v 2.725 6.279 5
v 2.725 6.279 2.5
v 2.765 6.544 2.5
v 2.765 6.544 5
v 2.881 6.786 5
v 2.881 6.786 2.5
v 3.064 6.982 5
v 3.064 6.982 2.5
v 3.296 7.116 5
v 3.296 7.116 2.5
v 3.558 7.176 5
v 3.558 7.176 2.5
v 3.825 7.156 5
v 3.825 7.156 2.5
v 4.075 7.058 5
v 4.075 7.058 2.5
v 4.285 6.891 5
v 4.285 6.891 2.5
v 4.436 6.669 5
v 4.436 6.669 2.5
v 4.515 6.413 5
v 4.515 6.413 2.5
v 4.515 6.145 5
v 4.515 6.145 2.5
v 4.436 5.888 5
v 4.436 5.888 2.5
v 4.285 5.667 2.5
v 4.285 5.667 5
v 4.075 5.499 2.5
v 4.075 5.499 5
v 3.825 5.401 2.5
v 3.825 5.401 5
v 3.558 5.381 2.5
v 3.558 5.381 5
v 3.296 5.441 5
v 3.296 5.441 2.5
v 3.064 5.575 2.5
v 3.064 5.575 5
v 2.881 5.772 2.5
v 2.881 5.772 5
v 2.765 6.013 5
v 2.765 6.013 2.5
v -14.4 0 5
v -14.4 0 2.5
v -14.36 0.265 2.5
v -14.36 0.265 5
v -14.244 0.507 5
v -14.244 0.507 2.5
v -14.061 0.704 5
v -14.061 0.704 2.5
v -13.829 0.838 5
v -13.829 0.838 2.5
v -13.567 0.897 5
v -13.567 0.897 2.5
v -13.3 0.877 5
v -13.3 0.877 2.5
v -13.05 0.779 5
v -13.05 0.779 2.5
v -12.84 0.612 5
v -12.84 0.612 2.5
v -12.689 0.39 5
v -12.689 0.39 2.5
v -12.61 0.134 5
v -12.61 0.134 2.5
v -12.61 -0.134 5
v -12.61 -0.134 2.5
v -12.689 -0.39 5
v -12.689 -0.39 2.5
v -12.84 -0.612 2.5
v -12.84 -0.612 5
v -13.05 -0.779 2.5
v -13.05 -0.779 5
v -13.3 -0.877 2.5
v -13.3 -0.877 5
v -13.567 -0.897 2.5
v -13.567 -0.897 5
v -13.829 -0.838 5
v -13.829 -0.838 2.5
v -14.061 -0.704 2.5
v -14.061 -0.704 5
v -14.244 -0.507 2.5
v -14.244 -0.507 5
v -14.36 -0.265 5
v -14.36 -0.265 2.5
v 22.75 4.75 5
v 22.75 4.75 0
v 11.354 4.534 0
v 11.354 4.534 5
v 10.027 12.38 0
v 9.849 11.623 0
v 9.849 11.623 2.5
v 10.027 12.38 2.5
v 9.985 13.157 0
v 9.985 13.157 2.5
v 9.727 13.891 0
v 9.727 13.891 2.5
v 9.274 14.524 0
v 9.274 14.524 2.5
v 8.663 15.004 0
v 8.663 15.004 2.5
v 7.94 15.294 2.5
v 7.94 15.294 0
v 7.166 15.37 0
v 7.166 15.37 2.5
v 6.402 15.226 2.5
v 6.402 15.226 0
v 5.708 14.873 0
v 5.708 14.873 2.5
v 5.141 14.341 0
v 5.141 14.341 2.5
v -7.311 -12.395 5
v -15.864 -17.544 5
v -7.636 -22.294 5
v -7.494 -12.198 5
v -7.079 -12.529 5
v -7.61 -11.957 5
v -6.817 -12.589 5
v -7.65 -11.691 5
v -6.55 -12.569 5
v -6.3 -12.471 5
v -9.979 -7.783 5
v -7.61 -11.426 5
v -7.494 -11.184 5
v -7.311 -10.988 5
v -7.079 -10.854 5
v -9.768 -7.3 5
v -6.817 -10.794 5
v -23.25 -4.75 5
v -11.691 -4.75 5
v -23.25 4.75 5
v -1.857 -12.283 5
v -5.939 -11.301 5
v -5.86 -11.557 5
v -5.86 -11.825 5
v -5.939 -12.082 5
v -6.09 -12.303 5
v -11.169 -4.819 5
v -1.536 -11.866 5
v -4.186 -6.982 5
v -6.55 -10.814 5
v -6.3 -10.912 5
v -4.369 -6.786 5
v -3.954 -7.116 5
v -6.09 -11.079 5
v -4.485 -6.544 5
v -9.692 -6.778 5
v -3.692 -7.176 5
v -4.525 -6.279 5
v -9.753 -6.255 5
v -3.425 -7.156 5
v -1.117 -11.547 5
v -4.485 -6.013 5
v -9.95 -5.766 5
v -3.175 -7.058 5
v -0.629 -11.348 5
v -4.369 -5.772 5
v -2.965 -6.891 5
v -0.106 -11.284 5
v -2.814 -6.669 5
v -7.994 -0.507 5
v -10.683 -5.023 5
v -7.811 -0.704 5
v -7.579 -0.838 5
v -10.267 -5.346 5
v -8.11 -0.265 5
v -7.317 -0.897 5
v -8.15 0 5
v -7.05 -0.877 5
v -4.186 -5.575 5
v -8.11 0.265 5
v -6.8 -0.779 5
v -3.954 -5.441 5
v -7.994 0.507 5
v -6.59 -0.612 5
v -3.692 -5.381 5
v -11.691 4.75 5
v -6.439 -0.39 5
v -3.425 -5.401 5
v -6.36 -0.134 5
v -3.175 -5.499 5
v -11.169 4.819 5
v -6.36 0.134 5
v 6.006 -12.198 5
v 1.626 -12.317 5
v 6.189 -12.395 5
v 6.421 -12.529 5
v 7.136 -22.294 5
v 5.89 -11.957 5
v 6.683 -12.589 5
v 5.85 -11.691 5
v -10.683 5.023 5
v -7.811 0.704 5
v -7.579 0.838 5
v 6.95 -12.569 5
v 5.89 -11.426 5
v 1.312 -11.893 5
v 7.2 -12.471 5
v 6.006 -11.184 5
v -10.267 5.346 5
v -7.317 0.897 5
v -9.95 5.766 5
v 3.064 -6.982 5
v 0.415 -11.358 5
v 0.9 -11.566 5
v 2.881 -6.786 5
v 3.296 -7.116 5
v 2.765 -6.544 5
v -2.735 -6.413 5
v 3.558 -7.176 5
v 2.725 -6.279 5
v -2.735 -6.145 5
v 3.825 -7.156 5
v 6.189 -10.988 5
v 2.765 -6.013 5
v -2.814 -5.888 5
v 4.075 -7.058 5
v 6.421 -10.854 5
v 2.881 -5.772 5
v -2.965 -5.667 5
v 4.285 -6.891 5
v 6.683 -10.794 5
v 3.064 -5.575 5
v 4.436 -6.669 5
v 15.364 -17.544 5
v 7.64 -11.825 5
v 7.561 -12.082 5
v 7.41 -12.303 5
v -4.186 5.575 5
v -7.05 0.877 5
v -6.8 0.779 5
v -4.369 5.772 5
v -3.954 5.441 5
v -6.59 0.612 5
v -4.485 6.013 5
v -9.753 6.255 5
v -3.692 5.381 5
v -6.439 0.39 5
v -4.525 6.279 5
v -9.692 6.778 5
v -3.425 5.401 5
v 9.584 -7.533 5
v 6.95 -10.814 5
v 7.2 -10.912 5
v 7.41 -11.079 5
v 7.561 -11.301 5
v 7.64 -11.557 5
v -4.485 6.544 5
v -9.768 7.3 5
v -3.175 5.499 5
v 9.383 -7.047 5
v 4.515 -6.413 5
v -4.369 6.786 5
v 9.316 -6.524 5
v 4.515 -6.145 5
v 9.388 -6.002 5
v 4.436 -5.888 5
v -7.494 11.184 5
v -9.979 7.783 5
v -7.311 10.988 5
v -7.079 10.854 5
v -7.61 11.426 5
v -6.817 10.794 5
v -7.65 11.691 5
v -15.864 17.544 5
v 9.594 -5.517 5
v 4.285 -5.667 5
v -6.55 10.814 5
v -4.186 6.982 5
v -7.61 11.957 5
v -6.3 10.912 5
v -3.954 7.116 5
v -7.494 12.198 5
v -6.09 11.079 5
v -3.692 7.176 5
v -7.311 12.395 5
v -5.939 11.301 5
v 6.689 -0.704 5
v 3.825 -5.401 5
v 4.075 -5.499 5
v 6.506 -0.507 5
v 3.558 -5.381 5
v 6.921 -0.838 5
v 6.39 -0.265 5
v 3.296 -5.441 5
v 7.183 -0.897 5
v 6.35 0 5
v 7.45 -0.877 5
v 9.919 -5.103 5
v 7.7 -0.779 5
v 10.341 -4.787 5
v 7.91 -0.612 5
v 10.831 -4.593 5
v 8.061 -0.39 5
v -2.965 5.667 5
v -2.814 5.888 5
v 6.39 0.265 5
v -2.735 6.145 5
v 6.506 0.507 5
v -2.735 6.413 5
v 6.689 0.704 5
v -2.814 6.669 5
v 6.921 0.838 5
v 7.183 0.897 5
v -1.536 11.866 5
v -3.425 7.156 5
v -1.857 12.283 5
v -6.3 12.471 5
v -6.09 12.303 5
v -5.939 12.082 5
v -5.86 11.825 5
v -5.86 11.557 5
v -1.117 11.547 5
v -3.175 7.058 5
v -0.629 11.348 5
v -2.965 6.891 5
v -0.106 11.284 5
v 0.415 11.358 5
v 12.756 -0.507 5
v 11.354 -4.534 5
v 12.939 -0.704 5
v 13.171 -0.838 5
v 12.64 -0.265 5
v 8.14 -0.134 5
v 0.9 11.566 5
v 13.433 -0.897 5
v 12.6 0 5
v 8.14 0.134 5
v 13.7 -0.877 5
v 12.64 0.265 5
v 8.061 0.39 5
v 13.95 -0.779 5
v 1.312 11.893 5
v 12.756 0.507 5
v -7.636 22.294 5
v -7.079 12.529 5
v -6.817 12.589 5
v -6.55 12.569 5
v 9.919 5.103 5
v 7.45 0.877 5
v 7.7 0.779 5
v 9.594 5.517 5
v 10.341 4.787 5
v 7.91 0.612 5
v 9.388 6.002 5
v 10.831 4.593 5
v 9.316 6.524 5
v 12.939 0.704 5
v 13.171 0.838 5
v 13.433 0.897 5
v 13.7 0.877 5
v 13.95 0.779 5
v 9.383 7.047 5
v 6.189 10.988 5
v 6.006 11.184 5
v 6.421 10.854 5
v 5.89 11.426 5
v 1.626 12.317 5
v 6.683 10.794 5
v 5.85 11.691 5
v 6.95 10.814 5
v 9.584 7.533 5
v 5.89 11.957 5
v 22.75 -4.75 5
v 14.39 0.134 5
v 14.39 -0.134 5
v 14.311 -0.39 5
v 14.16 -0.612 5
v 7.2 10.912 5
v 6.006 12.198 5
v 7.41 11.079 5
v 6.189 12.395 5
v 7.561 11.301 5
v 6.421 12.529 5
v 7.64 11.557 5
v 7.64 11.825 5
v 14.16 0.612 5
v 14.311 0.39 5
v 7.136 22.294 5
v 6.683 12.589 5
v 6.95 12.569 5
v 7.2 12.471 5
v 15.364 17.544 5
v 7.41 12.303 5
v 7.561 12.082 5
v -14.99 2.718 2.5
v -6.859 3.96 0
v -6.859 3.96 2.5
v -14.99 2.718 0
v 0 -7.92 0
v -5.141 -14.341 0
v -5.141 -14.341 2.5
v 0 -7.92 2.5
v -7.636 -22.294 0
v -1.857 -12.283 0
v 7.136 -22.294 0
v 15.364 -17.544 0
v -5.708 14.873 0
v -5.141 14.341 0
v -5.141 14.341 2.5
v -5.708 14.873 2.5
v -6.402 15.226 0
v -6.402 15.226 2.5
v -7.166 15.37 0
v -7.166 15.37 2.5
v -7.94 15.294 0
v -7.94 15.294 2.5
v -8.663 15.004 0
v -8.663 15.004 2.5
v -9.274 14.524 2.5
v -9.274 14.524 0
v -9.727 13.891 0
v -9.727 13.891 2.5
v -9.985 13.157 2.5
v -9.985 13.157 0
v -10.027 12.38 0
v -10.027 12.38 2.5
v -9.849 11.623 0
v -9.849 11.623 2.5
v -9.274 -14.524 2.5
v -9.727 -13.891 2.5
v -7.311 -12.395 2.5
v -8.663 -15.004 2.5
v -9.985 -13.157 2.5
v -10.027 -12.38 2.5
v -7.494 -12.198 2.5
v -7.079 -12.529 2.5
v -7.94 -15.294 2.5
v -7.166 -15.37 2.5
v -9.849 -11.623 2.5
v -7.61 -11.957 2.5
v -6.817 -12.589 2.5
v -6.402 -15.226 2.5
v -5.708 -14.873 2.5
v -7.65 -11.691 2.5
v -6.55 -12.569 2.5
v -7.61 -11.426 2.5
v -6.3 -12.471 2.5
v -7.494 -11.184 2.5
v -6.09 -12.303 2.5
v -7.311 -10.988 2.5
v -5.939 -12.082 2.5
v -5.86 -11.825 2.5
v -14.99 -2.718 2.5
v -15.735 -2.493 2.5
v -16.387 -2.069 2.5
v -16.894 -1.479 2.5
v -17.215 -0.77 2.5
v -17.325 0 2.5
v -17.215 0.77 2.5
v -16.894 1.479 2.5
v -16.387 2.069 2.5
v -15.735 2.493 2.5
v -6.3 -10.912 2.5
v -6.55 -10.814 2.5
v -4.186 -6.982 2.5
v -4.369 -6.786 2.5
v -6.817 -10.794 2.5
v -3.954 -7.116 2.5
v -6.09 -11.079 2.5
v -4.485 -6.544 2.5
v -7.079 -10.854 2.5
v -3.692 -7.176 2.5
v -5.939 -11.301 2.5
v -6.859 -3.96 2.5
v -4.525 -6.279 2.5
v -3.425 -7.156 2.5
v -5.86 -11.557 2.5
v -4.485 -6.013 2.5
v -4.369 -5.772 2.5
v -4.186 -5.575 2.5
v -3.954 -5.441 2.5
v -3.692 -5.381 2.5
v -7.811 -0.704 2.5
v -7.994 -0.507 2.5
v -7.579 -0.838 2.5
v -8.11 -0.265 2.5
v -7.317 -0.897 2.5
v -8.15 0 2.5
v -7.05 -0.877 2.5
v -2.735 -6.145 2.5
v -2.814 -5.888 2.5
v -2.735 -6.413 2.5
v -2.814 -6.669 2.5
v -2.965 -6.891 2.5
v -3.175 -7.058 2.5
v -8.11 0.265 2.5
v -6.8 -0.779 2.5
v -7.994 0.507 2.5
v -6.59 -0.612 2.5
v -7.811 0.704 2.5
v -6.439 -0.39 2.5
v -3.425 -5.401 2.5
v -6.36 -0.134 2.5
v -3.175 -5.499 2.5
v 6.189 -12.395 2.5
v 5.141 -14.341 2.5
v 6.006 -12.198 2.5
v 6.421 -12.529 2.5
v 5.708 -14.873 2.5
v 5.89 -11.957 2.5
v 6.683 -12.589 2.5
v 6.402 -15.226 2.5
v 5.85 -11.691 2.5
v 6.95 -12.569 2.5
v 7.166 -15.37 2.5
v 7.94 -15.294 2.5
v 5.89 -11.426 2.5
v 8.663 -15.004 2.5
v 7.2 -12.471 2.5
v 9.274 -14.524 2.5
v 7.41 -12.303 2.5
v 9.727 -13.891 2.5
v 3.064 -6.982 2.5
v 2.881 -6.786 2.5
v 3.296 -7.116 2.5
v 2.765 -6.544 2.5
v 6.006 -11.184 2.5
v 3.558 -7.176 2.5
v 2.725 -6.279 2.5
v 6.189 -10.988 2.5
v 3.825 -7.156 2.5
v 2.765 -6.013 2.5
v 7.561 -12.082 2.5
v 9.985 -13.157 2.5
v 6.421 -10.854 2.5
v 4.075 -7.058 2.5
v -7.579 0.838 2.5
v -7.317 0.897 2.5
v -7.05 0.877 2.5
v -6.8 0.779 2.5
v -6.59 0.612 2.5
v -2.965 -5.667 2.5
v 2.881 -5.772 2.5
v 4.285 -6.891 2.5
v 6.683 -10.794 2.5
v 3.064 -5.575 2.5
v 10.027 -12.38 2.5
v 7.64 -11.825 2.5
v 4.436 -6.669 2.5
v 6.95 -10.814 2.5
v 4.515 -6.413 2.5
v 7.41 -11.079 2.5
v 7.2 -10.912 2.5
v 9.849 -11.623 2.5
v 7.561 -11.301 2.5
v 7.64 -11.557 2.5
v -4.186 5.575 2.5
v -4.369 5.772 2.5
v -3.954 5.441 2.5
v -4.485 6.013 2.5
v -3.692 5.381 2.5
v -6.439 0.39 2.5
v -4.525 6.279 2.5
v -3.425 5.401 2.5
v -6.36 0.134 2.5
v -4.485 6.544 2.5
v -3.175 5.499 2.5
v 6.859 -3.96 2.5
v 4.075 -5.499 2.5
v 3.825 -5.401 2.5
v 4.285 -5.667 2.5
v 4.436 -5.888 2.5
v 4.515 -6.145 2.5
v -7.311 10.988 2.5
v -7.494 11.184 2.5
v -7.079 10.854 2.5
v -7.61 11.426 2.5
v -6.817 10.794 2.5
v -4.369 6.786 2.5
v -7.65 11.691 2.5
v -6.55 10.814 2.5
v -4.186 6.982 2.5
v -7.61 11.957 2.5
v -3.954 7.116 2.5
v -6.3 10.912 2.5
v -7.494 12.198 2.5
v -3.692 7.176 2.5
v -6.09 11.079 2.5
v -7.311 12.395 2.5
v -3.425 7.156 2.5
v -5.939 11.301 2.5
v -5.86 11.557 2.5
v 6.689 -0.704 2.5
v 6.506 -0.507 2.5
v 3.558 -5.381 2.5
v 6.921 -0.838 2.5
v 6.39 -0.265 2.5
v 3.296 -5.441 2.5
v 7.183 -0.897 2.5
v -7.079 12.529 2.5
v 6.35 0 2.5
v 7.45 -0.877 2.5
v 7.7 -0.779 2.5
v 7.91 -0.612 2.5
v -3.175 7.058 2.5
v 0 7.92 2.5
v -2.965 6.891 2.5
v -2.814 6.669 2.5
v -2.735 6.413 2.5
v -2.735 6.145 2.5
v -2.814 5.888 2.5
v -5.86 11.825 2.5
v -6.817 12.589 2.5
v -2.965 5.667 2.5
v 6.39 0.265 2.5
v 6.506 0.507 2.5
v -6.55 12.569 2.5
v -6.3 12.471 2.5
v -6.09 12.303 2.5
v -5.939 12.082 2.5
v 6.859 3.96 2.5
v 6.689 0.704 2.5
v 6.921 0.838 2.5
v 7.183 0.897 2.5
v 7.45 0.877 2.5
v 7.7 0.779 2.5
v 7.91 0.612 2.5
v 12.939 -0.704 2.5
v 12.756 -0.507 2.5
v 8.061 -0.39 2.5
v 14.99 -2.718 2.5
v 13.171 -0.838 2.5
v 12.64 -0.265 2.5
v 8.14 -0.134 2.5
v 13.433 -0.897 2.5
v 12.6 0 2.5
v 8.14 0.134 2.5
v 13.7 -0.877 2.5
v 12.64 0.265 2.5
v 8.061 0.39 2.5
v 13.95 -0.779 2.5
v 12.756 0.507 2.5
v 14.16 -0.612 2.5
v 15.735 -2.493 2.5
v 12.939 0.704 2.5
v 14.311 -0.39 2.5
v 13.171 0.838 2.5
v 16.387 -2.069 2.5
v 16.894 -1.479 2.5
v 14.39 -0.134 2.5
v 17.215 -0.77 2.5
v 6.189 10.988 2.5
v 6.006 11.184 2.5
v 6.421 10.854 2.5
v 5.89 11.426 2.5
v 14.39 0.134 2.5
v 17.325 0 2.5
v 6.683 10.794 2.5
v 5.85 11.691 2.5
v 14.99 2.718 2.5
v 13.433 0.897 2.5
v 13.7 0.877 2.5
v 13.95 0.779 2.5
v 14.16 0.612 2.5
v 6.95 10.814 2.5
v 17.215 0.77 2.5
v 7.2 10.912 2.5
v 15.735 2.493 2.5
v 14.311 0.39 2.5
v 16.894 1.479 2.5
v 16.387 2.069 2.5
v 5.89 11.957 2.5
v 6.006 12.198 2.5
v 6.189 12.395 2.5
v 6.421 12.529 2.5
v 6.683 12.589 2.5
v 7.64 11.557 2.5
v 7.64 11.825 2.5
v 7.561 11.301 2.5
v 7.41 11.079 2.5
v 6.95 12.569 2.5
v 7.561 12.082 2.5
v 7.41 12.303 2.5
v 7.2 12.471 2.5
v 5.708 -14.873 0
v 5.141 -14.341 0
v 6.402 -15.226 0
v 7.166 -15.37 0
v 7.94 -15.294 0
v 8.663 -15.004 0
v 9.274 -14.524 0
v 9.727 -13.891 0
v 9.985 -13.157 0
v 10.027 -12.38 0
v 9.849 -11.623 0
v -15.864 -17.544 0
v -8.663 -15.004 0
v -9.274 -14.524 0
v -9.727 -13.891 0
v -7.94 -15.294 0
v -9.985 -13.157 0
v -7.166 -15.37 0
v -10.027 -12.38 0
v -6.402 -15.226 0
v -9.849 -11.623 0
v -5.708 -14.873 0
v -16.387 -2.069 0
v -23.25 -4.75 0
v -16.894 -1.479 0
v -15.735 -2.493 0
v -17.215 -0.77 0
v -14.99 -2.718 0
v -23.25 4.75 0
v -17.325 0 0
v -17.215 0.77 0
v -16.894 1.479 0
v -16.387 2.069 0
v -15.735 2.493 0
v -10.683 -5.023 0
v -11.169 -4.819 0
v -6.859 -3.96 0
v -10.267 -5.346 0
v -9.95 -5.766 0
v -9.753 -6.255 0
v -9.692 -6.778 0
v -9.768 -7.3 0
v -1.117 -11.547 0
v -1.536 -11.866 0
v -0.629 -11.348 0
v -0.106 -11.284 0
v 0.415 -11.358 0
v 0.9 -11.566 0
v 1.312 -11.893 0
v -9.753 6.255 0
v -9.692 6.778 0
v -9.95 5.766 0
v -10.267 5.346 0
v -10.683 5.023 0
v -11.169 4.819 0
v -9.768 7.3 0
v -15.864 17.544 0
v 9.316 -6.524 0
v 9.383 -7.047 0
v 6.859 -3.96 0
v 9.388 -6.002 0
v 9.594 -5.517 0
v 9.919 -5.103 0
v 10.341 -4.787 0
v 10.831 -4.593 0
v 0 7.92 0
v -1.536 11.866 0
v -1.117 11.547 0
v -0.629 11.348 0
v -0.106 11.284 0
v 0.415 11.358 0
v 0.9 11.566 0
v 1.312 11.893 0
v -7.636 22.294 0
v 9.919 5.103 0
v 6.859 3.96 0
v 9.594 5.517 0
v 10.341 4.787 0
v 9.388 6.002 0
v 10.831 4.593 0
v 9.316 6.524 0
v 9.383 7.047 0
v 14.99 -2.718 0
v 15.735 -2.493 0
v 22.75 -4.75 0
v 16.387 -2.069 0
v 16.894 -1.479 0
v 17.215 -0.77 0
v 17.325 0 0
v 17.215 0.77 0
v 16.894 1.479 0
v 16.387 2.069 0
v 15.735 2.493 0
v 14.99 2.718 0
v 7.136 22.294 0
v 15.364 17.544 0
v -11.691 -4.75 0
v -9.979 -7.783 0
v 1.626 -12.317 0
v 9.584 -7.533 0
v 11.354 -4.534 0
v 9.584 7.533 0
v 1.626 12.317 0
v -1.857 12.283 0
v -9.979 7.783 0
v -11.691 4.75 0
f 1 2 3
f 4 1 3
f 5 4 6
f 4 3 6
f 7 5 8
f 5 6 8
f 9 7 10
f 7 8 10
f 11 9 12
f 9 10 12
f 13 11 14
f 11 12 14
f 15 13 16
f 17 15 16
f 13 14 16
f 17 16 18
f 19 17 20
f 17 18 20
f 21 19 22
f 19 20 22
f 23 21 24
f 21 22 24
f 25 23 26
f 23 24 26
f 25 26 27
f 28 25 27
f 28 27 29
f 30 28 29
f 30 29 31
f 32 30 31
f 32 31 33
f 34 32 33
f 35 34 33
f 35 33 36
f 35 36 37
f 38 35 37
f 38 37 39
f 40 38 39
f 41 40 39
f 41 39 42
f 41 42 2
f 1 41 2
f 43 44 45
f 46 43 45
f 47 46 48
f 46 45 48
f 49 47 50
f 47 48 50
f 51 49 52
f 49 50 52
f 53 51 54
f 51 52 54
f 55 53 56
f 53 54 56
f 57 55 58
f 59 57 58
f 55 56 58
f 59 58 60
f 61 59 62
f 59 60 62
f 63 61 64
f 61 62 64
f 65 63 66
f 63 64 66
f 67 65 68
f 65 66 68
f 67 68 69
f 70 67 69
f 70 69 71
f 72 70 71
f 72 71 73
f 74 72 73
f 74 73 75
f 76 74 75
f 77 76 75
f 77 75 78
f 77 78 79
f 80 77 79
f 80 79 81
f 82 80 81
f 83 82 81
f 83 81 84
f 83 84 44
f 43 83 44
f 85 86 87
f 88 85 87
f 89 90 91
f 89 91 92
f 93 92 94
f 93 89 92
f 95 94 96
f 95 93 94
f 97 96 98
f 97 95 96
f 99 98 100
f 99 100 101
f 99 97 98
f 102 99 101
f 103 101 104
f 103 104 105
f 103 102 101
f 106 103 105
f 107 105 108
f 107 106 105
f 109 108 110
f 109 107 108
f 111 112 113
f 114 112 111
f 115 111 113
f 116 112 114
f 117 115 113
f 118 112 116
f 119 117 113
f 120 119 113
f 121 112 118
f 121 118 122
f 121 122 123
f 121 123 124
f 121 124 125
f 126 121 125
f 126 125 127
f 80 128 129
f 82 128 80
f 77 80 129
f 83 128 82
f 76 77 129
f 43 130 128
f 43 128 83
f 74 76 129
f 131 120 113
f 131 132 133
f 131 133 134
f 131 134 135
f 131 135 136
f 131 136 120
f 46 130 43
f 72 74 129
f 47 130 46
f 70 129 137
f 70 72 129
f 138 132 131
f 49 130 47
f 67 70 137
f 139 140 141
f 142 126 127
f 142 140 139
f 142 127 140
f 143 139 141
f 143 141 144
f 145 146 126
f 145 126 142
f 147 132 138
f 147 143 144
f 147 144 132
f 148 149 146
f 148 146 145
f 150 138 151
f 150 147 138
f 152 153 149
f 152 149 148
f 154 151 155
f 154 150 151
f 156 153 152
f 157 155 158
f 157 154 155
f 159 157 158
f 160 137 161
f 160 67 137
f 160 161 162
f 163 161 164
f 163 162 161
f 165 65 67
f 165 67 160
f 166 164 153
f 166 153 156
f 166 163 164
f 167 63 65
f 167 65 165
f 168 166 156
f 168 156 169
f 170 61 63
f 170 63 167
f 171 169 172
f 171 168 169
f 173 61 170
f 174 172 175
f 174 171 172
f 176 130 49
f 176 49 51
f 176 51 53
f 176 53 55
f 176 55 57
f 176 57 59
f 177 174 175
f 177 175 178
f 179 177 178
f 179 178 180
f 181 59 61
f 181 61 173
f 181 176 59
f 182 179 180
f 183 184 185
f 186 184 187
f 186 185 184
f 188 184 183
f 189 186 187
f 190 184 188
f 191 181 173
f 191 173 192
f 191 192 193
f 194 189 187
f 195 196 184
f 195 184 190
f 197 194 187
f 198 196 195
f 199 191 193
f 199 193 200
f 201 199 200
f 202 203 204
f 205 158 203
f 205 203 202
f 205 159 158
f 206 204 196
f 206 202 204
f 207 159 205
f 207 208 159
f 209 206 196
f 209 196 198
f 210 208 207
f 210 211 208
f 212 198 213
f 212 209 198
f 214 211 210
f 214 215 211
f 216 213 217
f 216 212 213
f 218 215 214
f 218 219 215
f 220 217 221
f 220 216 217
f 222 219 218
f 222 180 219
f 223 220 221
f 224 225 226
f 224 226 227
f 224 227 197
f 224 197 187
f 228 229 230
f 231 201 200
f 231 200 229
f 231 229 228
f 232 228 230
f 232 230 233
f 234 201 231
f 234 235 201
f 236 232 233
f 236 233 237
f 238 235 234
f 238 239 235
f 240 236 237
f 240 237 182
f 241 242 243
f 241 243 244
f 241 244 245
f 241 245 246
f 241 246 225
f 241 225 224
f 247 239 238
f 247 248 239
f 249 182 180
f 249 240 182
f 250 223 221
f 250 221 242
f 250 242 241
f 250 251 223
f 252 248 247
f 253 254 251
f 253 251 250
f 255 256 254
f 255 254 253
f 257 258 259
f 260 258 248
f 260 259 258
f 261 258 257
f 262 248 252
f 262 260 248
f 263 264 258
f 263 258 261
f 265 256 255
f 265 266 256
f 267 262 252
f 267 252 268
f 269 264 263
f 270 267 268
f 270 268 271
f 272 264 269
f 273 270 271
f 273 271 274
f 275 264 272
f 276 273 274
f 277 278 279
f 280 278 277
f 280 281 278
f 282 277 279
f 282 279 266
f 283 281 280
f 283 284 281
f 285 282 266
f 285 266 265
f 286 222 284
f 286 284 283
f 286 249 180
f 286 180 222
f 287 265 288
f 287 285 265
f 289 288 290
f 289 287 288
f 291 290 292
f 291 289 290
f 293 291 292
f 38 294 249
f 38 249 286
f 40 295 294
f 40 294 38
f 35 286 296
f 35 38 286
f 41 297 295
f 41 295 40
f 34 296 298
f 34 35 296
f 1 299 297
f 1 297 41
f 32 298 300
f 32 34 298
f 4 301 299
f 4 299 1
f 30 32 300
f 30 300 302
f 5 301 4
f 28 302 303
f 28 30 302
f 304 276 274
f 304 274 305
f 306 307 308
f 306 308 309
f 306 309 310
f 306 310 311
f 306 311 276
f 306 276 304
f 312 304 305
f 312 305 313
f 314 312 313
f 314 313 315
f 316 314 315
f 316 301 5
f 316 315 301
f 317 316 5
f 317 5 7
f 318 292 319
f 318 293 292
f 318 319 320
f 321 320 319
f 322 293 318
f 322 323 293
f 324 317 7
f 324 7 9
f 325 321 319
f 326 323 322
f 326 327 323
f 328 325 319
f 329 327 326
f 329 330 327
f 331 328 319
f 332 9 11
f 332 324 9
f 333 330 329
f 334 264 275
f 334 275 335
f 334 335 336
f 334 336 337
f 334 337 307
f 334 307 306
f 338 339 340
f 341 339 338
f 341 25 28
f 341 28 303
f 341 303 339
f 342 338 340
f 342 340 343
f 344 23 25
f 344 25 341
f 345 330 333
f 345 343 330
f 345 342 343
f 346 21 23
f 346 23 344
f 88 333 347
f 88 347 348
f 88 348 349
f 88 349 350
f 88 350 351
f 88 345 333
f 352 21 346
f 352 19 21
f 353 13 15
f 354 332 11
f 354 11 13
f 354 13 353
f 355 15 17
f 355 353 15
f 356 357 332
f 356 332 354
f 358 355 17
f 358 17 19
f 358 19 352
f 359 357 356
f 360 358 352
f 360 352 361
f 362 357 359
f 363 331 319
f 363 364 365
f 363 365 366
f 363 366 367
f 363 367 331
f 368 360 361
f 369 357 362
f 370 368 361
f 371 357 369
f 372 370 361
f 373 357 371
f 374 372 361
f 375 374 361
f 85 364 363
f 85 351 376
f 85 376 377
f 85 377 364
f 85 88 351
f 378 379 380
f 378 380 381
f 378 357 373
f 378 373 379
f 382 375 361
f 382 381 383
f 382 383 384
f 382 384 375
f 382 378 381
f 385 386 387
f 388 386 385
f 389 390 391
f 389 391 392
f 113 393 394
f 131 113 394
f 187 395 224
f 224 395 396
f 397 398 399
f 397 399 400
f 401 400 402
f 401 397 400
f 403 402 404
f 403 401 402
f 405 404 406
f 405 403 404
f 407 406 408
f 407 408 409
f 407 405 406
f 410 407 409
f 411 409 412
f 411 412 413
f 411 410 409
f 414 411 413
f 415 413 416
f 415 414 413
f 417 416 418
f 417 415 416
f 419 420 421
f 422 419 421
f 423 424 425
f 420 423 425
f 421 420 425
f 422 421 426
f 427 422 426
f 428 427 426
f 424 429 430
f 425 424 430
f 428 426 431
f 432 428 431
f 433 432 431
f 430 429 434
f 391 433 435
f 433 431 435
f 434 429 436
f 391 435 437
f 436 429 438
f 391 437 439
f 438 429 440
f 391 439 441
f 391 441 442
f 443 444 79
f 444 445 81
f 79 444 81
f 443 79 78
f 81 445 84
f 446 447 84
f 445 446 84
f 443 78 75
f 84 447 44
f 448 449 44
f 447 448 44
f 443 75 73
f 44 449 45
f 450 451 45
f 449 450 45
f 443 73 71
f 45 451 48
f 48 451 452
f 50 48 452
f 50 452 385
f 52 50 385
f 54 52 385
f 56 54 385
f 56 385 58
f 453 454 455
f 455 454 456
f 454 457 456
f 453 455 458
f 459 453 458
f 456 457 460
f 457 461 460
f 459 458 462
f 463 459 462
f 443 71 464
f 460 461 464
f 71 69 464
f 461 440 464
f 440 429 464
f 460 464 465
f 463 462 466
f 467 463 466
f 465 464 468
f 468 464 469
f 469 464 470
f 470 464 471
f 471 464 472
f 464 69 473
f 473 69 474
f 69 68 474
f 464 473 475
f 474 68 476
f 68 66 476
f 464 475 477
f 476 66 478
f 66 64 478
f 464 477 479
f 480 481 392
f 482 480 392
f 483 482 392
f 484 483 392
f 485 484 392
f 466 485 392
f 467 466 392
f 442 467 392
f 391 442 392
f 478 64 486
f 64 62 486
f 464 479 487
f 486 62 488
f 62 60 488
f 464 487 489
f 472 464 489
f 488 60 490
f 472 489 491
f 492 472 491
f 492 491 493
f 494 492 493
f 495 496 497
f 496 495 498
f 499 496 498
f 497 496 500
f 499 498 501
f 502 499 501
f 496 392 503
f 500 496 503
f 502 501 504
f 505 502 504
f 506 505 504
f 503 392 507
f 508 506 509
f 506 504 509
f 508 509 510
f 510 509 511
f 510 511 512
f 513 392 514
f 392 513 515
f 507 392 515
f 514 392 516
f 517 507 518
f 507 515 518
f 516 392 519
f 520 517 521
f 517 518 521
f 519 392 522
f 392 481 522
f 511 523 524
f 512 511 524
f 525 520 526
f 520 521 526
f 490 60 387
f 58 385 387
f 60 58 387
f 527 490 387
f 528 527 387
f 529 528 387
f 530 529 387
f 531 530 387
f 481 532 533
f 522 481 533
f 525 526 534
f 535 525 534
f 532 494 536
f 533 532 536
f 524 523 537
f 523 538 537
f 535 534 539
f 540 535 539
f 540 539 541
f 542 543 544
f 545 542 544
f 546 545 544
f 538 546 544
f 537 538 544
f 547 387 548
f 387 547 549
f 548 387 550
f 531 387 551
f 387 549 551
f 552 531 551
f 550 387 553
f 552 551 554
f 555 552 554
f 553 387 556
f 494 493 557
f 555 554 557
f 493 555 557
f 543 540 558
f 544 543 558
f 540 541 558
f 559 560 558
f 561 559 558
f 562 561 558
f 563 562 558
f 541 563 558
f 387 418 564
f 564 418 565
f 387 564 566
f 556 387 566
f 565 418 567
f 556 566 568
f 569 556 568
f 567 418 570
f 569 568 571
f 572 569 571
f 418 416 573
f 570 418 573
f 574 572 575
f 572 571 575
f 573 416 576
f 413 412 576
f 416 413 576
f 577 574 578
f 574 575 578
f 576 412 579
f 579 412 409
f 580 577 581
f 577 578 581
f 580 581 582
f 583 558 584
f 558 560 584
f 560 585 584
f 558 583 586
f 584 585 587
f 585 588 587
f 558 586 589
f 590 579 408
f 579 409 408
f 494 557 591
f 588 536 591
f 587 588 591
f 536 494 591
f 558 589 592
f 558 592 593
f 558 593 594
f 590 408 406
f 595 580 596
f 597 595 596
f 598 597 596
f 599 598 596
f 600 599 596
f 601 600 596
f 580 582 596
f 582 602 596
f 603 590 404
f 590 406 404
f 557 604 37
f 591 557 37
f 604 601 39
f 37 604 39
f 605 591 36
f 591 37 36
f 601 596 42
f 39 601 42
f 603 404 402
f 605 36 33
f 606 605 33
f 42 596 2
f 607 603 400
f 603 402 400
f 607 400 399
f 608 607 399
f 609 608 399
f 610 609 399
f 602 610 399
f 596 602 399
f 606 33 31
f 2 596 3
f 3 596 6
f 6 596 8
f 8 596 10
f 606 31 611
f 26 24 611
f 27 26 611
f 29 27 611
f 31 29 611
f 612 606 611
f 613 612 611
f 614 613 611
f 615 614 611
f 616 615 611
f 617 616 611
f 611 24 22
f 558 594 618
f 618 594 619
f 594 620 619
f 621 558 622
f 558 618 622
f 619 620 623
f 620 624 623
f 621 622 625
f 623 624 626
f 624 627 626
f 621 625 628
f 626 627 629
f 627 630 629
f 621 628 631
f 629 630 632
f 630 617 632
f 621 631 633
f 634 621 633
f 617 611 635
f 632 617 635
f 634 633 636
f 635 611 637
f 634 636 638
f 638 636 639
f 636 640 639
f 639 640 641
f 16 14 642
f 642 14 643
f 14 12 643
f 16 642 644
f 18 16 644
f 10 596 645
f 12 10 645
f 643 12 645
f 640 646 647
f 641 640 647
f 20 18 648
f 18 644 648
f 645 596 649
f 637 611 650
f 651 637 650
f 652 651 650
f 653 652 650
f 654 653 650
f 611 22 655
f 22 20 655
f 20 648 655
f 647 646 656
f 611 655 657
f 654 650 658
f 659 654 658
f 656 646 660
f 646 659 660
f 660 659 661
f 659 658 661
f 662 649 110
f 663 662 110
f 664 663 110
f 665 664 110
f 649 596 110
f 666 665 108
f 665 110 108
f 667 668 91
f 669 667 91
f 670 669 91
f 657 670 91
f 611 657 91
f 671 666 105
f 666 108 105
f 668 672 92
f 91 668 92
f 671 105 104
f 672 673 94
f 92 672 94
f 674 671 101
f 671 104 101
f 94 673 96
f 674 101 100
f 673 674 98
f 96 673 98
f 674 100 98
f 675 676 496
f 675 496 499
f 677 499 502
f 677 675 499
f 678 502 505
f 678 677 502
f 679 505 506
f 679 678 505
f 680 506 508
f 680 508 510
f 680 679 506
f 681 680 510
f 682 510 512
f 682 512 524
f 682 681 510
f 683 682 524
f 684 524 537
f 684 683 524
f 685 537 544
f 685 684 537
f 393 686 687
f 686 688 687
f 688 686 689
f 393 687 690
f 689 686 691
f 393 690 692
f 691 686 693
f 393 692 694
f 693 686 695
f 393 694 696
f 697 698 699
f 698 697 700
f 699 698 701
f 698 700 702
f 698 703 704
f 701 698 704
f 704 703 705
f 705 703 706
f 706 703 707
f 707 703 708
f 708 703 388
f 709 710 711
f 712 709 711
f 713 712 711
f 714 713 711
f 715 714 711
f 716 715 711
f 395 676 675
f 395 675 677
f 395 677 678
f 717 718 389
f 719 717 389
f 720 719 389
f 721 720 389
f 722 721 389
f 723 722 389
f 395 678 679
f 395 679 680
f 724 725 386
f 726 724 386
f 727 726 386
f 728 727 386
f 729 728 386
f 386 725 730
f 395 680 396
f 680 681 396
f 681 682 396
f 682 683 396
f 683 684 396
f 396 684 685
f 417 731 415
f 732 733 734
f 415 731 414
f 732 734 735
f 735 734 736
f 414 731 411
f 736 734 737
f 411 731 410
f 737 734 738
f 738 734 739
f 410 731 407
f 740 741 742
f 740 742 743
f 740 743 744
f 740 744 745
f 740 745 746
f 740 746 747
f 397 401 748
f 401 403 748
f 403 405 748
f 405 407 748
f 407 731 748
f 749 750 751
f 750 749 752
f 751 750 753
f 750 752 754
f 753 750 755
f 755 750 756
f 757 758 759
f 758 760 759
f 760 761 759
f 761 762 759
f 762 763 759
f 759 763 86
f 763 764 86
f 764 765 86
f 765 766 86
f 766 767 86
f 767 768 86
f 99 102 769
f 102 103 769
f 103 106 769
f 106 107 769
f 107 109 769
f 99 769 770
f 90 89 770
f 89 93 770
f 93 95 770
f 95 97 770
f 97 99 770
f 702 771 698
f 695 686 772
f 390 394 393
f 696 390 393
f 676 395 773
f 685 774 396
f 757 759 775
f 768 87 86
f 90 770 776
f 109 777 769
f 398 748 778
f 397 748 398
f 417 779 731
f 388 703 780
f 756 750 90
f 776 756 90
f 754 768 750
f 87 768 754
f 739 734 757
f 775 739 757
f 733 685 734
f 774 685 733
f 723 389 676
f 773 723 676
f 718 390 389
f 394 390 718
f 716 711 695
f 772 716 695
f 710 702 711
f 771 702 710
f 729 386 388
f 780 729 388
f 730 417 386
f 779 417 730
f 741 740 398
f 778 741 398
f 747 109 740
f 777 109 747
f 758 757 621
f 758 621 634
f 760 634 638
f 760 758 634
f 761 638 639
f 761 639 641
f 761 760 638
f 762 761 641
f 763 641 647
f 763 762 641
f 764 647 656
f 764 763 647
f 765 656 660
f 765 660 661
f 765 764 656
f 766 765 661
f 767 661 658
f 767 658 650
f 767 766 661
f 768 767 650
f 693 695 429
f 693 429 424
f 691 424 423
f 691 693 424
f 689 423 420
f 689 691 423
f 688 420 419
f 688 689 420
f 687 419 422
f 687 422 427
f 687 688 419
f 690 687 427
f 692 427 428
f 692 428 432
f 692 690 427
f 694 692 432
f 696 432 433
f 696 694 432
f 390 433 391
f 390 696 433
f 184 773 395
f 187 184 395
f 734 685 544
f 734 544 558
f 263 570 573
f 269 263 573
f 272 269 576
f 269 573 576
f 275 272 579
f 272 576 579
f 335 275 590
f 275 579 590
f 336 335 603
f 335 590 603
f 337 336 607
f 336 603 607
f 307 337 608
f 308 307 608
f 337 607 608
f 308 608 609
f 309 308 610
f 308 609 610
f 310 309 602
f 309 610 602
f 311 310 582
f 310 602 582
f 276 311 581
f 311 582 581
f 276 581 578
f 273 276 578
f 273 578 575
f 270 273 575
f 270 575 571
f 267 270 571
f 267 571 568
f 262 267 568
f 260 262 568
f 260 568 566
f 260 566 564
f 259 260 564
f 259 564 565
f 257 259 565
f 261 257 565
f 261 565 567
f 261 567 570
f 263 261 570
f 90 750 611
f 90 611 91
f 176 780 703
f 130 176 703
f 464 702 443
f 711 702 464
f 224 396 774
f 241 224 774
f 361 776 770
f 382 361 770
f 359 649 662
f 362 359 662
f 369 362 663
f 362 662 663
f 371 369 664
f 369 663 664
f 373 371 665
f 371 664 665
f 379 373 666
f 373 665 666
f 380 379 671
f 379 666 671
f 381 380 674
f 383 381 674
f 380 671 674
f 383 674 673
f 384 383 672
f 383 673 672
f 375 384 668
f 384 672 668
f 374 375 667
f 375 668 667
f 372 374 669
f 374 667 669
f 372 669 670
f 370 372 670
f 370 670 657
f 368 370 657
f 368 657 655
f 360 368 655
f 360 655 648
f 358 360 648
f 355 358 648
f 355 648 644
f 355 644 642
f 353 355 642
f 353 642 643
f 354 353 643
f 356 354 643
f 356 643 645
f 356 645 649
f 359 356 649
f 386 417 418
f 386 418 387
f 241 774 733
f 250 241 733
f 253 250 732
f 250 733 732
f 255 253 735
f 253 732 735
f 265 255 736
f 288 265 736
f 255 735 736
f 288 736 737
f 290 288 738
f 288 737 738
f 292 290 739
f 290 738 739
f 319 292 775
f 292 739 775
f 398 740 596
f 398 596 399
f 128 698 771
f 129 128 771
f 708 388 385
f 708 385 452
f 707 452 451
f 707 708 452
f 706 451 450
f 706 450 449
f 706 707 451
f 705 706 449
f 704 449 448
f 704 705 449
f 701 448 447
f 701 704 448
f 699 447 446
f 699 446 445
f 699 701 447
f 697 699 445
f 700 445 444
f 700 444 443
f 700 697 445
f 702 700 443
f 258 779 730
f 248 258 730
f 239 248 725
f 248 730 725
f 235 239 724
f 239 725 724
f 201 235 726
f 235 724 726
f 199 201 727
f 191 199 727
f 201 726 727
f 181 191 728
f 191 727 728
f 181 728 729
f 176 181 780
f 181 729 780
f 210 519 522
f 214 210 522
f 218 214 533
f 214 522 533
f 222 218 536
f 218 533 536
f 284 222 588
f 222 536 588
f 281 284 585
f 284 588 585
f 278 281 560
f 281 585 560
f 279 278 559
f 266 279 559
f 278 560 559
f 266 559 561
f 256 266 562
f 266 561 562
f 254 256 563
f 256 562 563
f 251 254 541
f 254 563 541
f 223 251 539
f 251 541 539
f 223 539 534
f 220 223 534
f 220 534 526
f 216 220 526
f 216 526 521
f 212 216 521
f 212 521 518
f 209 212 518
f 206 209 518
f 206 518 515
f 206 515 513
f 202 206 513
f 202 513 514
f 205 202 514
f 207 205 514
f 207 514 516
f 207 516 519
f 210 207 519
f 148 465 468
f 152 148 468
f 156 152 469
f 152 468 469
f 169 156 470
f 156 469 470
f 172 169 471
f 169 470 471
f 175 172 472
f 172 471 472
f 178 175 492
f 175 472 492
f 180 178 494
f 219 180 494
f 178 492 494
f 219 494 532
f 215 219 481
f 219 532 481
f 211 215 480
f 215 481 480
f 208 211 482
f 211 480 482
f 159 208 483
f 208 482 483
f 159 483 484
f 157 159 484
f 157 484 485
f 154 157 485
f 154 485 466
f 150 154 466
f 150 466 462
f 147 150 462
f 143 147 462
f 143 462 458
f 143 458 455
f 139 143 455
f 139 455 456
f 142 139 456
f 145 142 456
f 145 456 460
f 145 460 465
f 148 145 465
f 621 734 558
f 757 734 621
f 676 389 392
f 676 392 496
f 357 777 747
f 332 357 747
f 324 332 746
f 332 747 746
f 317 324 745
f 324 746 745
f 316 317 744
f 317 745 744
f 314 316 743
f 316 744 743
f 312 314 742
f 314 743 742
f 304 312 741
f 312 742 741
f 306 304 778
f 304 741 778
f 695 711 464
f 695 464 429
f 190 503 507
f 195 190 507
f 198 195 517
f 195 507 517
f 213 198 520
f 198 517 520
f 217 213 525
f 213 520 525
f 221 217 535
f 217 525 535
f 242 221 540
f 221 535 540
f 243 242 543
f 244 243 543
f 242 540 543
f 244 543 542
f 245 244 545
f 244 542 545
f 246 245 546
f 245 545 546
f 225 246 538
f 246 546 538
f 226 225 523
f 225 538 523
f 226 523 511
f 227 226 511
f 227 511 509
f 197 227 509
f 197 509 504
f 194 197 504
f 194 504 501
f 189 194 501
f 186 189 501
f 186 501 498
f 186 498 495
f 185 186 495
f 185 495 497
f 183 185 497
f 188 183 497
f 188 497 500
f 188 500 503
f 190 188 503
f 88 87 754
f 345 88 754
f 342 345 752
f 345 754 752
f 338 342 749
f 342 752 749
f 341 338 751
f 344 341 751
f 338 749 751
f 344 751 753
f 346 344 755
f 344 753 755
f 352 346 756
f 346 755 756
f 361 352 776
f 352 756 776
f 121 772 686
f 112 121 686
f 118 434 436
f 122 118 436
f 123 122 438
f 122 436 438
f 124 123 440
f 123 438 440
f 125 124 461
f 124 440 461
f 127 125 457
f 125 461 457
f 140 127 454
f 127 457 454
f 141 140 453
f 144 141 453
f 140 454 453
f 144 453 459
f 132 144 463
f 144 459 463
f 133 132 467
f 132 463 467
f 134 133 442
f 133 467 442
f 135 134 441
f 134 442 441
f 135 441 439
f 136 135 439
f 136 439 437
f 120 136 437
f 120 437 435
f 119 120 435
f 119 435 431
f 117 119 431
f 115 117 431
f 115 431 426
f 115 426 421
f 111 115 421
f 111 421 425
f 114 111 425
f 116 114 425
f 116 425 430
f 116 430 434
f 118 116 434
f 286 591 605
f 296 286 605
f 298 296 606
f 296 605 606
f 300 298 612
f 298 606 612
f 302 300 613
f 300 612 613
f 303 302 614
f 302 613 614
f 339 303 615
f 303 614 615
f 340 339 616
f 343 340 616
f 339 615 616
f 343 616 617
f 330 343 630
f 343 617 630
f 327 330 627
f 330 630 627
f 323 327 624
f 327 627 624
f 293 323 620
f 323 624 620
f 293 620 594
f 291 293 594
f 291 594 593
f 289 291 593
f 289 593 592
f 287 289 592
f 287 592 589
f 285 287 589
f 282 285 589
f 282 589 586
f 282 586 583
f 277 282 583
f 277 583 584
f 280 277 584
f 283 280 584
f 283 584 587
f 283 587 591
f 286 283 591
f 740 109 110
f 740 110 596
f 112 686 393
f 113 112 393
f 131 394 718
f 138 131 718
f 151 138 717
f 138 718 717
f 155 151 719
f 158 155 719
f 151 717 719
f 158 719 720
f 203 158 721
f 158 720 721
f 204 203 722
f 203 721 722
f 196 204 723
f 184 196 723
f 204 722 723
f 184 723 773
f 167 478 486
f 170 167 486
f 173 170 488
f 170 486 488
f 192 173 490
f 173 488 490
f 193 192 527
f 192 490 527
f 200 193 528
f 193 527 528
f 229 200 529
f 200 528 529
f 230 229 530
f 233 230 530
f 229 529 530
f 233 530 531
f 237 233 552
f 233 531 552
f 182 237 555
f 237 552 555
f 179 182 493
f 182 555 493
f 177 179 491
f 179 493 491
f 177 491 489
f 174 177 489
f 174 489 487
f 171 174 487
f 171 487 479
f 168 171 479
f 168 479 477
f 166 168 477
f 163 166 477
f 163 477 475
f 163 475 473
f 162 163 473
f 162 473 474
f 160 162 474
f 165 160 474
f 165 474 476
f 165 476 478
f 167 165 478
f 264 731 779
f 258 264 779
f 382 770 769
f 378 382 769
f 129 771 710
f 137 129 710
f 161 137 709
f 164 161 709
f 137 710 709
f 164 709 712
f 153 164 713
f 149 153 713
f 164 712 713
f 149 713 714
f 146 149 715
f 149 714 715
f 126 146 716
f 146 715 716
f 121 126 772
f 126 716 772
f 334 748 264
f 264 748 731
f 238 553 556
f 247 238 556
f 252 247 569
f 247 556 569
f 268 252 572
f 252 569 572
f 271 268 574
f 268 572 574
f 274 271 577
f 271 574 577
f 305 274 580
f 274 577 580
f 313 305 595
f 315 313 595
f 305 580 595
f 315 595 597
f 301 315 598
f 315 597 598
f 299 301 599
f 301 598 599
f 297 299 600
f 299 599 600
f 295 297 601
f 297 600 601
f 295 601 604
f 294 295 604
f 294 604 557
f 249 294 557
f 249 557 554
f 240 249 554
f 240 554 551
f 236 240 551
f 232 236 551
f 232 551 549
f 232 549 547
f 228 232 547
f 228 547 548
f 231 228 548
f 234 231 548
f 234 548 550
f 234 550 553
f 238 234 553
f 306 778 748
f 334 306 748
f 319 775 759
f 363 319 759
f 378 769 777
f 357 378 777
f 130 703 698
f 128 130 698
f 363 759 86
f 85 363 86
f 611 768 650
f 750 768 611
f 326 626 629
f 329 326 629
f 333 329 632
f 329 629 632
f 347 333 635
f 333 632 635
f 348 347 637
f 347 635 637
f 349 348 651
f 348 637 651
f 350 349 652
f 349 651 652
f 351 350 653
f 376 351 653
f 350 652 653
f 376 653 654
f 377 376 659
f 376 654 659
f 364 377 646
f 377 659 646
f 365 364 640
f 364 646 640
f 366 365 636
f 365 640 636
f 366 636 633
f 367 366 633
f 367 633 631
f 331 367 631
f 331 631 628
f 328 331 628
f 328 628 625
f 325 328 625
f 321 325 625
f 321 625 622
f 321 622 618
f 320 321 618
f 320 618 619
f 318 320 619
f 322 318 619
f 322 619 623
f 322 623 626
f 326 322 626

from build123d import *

# Parameters (mm, degrees)
BOSS_EXTRUDE2_DEPTH = 5
CUT_EXTRUDE5_DEPTH  = 2.5
SKETCH8_R           = 0.9
CUT_EXTRUDE6_DEPTH  = 33.308147585


with BuildPart() as part:
    # Sketch1 → Boss-Extrude2 (new body)
    with BuildSketch(Plane.XY):
        with BuildLine():
            Line((-23.25, 4.75), (-23.25, -4.75))
            Line((-23.25, -4.75), (-11.691342951, -4.75))
            ThreePointArc((-11.691342951, -4.75), (-9.949887623, -5.766468943), (-9.978567551, -7.78266666))
            Line((-9.978567551, -7.78266666), (-15.863620668, -17.543584287))
            Line((-15.863620668, -17.543584287), (-7.636379332, -22.293584287))
            Line((-7.636379332, -22.293584287), (-1.857050808, -12.283493649))
            ThreePointArc((-1.857050808, -12.283493649), (-0.106035217, -11.283583567), (1.625703261, -12.316519972))
            Line((1.625703261, -12.316519972), (7.136379332, -22.293584287))
            Line((7.136379332, -22.293584287), (15.363620668, -17.543584287))
            Line((15.363620668, -17.543584287), (9.584292144, -7.533493649))
            ThreePointArc((9.584292144, -7.533493649), (9.593852406, -5.517114624), (11.354270812, -4.533853312))
            Line((11.354270812, -4.533853312), (22.75, -4.75))
            Line((22.75, -4.75), (22.75, 4.75))
            Line((22.75, 4.75), (11.354270812, 4.533853312))
            ThreePointArc((11.354270812, 4.533853312), (9.593852406, 5.517114624), (9.584292144, 7.533493649))
            Line((9.584292144, 7.533493649), (15.363620668, 17.543584287))
            Line((15.363620668, 17.543584287), (7.136379332, 22.293584287))
            Line((7.136379332, 22.293584287), (1.625703261, 12.316519972))
            ThreePointArc((1.625703261, 12.316519972), (-0.106035217, 11.283583567), (-1.857050808, 12.283493649))
            Line((-1.857050808, 12.283493649), (-7.636379332, 22.293584287))
            Line((-7.636379332, 22.293584287), (-15.863620668, 17.543584287))
            Line((-15.863620668, 17.543584287), (-9.978567551, 7.78266666))
            ThreePointArc((-9.978567551, 7.78266666), (-9.949887623, 5.766468943), (-11.691342951, 4.75))
            Line((-11.691342951, 4.75), (-23.25, 4.75))
        make_face()
    extrude(amount=BOSS_EXTRUDE2_DEPTH)

    # Sketch7 → Cut-Extrude5 (cut)
    with BuildSketch(Plane(origin=(0, 0, 0), x_dir=(-1, 0, 0), z_dir=(0, 0, -1))):
        with BuildLine():
            Line((-6.859008781, 3.960050566), (-9.849329973, 11.622556693))
            ThreePointArc((-9.849329973, 11.622556693), (-8.6625, 15.003890121), (-5.140764367, 14.341048313))
            Line((-5.140764367, 14.341048313), (0, 7.920101132))
            Line((0, 7.920101132), (5.140764367, 14.341048313))
            ThreePointArc((5.140764367, 14.341048313), (8.6625, 15.003890121), (9.849329973, 11.622556693))
            Line((9.849329973, 11.622556693), (6.859008781, 3.960050566))
            Line((6.859008781, 3.960050566), (14.99009434, 2.71849162))
            ThreePointArc((14.99009434, 2.71849162), (17.325, 0), (14.99009434, -2.71849162))
            Line((14.99009434, -2.71849162), (6.859008781, -3.960050566))
            Line((6.859008781, -3.960050566), (9.849329973, -11.622556693))
            ThreePointArc((9.849329973, -11.622556693), (8.6625, -15.003890121), (5.140764367, -14.341048313))
            Line((5.140764367, -14.341048313), (0, -7.920101132))
            Line((0, -7.920101132), (-5.140764367, -14.341048313))
            ThreePointArc((-5.140764367, -14.341048313), (-8.6625, -15.003890121), (-9.849329973, -11.622556693))
            Line((-9.849329973, -11.622556693), (-6.859008781, -3.960050566))
            Line((-6.859008781, -3.960050566), (-14.99009434, -2.71849162))
            ThreePointArc((-14.99009434, -2.71849162), (-17.325, 0), (-14.99009434, 2.71849162))
            Line((-14.99009434, 2.71849162), (-6.859008781, 3.960050566))
        make_face()
    extrude(amount=-CUT_EXTRUDE5_DEPTH, mode=Mode.SUBTRACT)

    # Sketch8 → Cut-Extrude6 (cut, through all)
    with BuildSketch(Plane(origin=(0, 0, 2.5), x_dir=(-1, 0, 0), z_dir=(0, 0, -1))):
        with Locations((7.25, 0)):
            Circle(SKETCH8_R)
        with Locations((13.5, 0)):
            Circle(SKETCH8_R)
        with Locations((6.75, -11.691342951)):
            Circle(SKETCH8_R)
        with Locations((3.625, -6.278684177)):
            Circle(SKETCH8_R)
        with Locations((-6.75, -11.691342951)):
            Circle(SKETCH8_R)
        with Locations((-3.625, -6.278684177)):
            Circle(SKETCH8_R)
        with Locations((-13.5, 0)):
            Circle(SKETCH8_R)
        with Locations((-7.25, 0)):
            Circle(SKETCH8_R)
        with Locations((-6.75, 11.691342951)):
            Circle(SKETCH8_R)
        with Locations((-3.625, 6.278684177)):
            Circle(SKETCH8_R)
        with Locations((6.75, 11.691342951)):
            Circle(SKETCH8_R)
        with Locations((3.625, 6.278684177)):
            Circle(SKETCH8_R)
    extrude(amount=-CUT_EXTRUDE6_DEPTH, mode=Mode.SUBTRACT)


solid = part.part
